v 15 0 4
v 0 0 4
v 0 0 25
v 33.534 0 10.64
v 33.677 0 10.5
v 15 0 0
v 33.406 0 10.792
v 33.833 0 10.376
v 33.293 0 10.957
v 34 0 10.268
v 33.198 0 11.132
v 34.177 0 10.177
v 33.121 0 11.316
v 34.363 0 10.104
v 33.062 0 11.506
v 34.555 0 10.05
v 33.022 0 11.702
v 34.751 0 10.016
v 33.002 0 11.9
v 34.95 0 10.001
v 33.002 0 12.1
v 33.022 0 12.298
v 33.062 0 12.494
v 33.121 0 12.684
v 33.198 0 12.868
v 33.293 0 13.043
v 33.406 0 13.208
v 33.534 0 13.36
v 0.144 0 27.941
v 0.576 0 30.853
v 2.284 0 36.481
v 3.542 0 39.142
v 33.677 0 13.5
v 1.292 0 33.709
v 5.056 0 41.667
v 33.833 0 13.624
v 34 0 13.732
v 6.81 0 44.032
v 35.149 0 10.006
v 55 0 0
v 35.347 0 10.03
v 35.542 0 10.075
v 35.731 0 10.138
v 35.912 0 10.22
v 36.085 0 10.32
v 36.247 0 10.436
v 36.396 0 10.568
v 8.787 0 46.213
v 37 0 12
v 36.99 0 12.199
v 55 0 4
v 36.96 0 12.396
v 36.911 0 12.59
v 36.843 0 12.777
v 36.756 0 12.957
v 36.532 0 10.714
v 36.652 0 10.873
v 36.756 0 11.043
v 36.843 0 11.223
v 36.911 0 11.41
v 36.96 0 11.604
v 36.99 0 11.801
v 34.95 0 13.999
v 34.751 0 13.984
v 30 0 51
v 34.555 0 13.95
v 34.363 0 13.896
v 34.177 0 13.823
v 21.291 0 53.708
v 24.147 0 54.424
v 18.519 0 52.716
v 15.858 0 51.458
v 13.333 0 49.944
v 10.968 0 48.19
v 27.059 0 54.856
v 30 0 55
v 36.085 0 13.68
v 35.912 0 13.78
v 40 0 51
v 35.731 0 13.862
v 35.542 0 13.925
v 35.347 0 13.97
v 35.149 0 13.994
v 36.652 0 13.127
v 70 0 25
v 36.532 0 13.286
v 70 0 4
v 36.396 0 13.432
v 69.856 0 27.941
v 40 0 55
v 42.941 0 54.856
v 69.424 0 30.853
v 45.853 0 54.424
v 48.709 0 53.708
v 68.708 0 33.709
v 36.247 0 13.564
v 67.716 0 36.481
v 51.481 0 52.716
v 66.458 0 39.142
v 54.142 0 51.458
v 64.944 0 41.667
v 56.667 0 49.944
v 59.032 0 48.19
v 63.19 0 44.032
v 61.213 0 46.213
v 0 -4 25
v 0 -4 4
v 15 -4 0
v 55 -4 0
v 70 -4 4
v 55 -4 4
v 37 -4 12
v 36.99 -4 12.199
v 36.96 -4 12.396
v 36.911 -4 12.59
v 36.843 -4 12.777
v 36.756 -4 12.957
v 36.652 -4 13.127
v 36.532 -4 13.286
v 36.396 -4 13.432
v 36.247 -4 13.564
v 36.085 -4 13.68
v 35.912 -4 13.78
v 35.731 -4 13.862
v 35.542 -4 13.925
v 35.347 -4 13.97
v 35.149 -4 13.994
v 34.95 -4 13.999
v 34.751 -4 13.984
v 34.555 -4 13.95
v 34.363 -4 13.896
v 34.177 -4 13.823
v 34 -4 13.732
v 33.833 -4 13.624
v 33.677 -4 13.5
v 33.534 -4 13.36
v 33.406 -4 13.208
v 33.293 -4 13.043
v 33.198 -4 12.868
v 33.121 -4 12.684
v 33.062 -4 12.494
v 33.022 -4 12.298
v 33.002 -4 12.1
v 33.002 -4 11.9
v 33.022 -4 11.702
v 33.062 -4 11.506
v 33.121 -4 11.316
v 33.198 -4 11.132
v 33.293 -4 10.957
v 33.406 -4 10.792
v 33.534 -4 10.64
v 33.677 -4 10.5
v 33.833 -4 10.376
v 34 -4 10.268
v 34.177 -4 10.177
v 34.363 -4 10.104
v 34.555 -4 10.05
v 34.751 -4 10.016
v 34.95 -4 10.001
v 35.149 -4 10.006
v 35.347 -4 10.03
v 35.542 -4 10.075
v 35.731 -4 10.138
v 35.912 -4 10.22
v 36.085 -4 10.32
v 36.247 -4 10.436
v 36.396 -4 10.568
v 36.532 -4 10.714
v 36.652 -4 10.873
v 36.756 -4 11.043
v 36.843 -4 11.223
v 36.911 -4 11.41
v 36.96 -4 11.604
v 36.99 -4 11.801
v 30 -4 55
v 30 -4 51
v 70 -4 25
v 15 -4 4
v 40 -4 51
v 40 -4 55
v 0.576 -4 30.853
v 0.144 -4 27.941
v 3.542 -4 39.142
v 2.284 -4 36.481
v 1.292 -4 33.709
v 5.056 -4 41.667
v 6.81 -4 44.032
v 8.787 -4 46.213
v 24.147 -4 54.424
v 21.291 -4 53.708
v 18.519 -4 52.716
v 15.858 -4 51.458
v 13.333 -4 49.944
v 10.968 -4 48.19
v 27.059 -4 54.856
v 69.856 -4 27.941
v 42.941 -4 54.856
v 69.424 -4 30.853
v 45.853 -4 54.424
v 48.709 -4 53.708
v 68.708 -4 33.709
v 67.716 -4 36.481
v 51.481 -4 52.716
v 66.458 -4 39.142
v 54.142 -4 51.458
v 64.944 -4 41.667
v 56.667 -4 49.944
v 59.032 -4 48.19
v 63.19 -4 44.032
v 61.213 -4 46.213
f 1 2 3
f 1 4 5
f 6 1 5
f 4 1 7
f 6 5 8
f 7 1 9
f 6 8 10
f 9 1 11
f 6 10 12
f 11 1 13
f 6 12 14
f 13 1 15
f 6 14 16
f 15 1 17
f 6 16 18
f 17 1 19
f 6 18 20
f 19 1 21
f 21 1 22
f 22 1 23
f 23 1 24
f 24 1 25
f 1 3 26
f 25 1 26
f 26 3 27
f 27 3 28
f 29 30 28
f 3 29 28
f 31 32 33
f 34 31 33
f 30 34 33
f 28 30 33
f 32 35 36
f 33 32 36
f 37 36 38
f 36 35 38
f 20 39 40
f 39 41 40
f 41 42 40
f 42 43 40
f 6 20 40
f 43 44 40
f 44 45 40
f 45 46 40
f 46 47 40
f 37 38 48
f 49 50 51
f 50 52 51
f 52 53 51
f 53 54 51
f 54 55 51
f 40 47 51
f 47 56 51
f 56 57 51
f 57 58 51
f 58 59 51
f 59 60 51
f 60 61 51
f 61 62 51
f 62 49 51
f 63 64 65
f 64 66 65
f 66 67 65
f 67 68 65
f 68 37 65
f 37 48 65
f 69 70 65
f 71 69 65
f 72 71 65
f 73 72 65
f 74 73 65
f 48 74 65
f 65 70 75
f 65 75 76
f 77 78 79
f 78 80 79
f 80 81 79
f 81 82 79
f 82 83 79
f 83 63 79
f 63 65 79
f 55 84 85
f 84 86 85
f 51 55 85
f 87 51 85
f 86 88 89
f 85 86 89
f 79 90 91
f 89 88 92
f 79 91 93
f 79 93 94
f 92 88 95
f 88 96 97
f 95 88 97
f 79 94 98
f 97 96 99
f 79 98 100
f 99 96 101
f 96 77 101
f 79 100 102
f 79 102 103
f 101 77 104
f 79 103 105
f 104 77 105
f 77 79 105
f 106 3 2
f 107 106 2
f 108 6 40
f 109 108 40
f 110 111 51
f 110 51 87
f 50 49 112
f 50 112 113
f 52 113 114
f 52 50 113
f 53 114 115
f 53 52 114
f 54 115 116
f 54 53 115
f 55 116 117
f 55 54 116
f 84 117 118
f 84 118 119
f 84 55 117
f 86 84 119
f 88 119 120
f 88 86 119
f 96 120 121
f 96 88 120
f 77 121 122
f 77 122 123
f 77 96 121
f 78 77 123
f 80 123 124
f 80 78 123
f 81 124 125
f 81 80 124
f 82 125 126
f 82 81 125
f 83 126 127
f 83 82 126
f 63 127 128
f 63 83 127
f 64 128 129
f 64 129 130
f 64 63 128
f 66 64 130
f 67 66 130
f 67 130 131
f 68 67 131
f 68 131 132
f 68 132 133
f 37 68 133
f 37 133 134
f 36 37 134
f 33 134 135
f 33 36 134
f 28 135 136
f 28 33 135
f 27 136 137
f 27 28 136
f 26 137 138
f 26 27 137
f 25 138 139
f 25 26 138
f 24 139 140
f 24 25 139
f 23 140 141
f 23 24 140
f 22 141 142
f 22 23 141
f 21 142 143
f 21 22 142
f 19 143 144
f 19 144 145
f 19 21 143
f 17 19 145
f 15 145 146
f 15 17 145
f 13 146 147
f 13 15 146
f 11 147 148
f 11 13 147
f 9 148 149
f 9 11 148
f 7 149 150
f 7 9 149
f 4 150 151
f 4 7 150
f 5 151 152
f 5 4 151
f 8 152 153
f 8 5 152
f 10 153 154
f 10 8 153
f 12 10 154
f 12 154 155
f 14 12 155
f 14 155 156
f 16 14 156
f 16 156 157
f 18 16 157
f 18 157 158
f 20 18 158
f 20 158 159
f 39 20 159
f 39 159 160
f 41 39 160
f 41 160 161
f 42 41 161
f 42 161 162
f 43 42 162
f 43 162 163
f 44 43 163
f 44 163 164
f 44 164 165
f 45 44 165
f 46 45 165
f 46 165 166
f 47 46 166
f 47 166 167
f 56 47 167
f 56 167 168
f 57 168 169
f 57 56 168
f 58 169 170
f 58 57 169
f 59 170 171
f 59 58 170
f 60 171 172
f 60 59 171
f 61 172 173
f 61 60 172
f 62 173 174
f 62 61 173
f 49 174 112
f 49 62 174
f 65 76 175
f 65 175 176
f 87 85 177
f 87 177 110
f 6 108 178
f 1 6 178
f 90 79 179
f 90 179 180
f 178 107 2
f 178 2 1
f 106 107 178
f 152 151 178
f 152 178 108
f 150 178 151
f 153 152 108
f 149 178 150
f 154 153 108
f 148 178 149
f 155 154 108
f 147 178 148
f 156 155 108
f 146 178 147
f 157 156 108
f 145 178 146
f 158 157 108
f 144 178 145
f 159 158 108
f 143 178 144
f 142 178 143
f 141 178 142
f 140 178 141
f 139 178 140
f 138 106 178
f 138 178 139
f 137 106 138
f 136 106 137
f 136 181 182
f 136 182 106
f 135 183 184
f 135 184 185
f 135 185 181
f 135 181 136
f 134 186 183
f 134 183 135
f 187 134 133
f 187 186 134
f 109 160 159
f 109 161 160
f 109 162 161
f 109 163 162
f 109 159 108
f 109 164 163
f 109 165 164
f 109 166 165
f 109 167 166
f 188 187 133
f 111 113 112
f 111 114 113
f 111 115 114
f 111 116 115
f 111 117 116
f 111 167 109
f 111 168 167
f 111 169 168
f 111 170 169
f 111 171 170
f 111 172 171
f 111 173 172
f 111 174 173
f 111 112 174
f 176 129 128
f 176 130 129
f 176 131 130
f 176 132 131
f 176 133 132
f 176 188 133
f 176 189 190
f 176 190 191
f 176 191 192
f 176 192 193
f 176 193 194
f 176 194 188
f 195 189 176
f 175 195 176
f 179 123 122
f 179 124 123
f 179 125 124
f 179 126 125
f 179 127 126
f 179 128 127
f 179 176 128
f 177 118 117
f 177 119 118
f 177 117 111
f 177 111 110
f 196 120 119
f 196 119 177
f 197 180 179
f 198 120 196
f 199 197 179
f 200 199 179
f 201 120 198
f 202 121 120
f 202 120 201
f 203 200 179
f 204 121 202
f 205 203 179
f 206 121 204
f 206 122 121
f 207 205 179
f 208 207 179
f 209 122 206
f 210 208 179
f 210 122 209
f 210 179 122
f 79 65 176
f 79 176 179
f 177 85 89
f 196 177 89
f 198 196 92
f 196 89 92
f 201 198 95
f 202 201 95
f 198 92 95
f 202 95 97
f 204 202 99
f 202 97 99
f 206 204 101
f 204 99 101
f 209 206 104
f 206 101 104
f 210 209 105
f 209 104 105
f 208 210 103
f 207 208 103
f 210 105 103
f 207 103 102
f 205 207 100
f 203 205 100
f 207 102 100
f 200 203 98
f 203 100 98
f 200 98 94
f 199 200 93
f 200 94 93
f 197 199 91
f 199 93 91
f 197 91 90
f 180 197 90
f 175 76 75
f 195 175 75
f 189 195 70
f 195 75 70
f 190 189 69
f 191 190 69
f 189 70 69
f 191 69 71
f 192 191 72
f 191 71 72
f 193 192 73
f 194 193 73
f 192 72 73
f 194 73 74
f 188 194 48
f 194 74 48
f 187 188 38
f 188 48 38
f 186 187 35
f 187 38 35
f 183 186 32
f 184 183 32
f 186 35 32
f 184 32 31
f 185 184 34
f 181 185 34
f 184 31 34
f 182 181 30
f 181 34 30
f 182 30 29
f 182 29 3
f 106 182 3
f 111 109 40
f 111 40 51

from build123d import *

# Parameters (mm, degrees)
SKETCH_R     = 2
PAD_DEPTH    = 4
SKETCH001_W  = 15
SKETCH001_H  = 4
POCKET_DEPTH = 5


with BuildPart() as part:
    # Sketch → Pad (new body)
    with BuildSketch(Plane.XZ):
        with BuildLine():
            Line((0, 25), (0, 0))
            Line((0, 0), (70, 0))
            Line((70, 25), (70, 0))
            ThreePointArc((70, 25), (61.213203, 46.213203), (40, 55))
            Line((40, 51), (40, 55))
            Line((30, 51), (40, 51))
            Line((30, 55), (30, 51))
            ThreePointArc((30, 55), (8.786797, 46.213203), (0, 25))
        make_face()
        with Locations((35, 12)):
            Circle(SKETCH_R, mode=Mode.SUBTRACT)
    extrude(amount=PAD_DEPTH)

    # Sketch001 (on Face11 of Pad) → Pocket (cut)
    with BuildSketch(Plane.XZ.offset(4)):
        with Locations((7.5, 2)):
            Rectangle(SKETCH001_W, SKETCH001_H)
        with Locations((62.5, 2)):
            Rectangle(SKETCH001_W, SKETCH001_H)
    extrude(amount=-POCKET_DEPTH, mode=Mode.SUBTRACT)


solid = part.part
